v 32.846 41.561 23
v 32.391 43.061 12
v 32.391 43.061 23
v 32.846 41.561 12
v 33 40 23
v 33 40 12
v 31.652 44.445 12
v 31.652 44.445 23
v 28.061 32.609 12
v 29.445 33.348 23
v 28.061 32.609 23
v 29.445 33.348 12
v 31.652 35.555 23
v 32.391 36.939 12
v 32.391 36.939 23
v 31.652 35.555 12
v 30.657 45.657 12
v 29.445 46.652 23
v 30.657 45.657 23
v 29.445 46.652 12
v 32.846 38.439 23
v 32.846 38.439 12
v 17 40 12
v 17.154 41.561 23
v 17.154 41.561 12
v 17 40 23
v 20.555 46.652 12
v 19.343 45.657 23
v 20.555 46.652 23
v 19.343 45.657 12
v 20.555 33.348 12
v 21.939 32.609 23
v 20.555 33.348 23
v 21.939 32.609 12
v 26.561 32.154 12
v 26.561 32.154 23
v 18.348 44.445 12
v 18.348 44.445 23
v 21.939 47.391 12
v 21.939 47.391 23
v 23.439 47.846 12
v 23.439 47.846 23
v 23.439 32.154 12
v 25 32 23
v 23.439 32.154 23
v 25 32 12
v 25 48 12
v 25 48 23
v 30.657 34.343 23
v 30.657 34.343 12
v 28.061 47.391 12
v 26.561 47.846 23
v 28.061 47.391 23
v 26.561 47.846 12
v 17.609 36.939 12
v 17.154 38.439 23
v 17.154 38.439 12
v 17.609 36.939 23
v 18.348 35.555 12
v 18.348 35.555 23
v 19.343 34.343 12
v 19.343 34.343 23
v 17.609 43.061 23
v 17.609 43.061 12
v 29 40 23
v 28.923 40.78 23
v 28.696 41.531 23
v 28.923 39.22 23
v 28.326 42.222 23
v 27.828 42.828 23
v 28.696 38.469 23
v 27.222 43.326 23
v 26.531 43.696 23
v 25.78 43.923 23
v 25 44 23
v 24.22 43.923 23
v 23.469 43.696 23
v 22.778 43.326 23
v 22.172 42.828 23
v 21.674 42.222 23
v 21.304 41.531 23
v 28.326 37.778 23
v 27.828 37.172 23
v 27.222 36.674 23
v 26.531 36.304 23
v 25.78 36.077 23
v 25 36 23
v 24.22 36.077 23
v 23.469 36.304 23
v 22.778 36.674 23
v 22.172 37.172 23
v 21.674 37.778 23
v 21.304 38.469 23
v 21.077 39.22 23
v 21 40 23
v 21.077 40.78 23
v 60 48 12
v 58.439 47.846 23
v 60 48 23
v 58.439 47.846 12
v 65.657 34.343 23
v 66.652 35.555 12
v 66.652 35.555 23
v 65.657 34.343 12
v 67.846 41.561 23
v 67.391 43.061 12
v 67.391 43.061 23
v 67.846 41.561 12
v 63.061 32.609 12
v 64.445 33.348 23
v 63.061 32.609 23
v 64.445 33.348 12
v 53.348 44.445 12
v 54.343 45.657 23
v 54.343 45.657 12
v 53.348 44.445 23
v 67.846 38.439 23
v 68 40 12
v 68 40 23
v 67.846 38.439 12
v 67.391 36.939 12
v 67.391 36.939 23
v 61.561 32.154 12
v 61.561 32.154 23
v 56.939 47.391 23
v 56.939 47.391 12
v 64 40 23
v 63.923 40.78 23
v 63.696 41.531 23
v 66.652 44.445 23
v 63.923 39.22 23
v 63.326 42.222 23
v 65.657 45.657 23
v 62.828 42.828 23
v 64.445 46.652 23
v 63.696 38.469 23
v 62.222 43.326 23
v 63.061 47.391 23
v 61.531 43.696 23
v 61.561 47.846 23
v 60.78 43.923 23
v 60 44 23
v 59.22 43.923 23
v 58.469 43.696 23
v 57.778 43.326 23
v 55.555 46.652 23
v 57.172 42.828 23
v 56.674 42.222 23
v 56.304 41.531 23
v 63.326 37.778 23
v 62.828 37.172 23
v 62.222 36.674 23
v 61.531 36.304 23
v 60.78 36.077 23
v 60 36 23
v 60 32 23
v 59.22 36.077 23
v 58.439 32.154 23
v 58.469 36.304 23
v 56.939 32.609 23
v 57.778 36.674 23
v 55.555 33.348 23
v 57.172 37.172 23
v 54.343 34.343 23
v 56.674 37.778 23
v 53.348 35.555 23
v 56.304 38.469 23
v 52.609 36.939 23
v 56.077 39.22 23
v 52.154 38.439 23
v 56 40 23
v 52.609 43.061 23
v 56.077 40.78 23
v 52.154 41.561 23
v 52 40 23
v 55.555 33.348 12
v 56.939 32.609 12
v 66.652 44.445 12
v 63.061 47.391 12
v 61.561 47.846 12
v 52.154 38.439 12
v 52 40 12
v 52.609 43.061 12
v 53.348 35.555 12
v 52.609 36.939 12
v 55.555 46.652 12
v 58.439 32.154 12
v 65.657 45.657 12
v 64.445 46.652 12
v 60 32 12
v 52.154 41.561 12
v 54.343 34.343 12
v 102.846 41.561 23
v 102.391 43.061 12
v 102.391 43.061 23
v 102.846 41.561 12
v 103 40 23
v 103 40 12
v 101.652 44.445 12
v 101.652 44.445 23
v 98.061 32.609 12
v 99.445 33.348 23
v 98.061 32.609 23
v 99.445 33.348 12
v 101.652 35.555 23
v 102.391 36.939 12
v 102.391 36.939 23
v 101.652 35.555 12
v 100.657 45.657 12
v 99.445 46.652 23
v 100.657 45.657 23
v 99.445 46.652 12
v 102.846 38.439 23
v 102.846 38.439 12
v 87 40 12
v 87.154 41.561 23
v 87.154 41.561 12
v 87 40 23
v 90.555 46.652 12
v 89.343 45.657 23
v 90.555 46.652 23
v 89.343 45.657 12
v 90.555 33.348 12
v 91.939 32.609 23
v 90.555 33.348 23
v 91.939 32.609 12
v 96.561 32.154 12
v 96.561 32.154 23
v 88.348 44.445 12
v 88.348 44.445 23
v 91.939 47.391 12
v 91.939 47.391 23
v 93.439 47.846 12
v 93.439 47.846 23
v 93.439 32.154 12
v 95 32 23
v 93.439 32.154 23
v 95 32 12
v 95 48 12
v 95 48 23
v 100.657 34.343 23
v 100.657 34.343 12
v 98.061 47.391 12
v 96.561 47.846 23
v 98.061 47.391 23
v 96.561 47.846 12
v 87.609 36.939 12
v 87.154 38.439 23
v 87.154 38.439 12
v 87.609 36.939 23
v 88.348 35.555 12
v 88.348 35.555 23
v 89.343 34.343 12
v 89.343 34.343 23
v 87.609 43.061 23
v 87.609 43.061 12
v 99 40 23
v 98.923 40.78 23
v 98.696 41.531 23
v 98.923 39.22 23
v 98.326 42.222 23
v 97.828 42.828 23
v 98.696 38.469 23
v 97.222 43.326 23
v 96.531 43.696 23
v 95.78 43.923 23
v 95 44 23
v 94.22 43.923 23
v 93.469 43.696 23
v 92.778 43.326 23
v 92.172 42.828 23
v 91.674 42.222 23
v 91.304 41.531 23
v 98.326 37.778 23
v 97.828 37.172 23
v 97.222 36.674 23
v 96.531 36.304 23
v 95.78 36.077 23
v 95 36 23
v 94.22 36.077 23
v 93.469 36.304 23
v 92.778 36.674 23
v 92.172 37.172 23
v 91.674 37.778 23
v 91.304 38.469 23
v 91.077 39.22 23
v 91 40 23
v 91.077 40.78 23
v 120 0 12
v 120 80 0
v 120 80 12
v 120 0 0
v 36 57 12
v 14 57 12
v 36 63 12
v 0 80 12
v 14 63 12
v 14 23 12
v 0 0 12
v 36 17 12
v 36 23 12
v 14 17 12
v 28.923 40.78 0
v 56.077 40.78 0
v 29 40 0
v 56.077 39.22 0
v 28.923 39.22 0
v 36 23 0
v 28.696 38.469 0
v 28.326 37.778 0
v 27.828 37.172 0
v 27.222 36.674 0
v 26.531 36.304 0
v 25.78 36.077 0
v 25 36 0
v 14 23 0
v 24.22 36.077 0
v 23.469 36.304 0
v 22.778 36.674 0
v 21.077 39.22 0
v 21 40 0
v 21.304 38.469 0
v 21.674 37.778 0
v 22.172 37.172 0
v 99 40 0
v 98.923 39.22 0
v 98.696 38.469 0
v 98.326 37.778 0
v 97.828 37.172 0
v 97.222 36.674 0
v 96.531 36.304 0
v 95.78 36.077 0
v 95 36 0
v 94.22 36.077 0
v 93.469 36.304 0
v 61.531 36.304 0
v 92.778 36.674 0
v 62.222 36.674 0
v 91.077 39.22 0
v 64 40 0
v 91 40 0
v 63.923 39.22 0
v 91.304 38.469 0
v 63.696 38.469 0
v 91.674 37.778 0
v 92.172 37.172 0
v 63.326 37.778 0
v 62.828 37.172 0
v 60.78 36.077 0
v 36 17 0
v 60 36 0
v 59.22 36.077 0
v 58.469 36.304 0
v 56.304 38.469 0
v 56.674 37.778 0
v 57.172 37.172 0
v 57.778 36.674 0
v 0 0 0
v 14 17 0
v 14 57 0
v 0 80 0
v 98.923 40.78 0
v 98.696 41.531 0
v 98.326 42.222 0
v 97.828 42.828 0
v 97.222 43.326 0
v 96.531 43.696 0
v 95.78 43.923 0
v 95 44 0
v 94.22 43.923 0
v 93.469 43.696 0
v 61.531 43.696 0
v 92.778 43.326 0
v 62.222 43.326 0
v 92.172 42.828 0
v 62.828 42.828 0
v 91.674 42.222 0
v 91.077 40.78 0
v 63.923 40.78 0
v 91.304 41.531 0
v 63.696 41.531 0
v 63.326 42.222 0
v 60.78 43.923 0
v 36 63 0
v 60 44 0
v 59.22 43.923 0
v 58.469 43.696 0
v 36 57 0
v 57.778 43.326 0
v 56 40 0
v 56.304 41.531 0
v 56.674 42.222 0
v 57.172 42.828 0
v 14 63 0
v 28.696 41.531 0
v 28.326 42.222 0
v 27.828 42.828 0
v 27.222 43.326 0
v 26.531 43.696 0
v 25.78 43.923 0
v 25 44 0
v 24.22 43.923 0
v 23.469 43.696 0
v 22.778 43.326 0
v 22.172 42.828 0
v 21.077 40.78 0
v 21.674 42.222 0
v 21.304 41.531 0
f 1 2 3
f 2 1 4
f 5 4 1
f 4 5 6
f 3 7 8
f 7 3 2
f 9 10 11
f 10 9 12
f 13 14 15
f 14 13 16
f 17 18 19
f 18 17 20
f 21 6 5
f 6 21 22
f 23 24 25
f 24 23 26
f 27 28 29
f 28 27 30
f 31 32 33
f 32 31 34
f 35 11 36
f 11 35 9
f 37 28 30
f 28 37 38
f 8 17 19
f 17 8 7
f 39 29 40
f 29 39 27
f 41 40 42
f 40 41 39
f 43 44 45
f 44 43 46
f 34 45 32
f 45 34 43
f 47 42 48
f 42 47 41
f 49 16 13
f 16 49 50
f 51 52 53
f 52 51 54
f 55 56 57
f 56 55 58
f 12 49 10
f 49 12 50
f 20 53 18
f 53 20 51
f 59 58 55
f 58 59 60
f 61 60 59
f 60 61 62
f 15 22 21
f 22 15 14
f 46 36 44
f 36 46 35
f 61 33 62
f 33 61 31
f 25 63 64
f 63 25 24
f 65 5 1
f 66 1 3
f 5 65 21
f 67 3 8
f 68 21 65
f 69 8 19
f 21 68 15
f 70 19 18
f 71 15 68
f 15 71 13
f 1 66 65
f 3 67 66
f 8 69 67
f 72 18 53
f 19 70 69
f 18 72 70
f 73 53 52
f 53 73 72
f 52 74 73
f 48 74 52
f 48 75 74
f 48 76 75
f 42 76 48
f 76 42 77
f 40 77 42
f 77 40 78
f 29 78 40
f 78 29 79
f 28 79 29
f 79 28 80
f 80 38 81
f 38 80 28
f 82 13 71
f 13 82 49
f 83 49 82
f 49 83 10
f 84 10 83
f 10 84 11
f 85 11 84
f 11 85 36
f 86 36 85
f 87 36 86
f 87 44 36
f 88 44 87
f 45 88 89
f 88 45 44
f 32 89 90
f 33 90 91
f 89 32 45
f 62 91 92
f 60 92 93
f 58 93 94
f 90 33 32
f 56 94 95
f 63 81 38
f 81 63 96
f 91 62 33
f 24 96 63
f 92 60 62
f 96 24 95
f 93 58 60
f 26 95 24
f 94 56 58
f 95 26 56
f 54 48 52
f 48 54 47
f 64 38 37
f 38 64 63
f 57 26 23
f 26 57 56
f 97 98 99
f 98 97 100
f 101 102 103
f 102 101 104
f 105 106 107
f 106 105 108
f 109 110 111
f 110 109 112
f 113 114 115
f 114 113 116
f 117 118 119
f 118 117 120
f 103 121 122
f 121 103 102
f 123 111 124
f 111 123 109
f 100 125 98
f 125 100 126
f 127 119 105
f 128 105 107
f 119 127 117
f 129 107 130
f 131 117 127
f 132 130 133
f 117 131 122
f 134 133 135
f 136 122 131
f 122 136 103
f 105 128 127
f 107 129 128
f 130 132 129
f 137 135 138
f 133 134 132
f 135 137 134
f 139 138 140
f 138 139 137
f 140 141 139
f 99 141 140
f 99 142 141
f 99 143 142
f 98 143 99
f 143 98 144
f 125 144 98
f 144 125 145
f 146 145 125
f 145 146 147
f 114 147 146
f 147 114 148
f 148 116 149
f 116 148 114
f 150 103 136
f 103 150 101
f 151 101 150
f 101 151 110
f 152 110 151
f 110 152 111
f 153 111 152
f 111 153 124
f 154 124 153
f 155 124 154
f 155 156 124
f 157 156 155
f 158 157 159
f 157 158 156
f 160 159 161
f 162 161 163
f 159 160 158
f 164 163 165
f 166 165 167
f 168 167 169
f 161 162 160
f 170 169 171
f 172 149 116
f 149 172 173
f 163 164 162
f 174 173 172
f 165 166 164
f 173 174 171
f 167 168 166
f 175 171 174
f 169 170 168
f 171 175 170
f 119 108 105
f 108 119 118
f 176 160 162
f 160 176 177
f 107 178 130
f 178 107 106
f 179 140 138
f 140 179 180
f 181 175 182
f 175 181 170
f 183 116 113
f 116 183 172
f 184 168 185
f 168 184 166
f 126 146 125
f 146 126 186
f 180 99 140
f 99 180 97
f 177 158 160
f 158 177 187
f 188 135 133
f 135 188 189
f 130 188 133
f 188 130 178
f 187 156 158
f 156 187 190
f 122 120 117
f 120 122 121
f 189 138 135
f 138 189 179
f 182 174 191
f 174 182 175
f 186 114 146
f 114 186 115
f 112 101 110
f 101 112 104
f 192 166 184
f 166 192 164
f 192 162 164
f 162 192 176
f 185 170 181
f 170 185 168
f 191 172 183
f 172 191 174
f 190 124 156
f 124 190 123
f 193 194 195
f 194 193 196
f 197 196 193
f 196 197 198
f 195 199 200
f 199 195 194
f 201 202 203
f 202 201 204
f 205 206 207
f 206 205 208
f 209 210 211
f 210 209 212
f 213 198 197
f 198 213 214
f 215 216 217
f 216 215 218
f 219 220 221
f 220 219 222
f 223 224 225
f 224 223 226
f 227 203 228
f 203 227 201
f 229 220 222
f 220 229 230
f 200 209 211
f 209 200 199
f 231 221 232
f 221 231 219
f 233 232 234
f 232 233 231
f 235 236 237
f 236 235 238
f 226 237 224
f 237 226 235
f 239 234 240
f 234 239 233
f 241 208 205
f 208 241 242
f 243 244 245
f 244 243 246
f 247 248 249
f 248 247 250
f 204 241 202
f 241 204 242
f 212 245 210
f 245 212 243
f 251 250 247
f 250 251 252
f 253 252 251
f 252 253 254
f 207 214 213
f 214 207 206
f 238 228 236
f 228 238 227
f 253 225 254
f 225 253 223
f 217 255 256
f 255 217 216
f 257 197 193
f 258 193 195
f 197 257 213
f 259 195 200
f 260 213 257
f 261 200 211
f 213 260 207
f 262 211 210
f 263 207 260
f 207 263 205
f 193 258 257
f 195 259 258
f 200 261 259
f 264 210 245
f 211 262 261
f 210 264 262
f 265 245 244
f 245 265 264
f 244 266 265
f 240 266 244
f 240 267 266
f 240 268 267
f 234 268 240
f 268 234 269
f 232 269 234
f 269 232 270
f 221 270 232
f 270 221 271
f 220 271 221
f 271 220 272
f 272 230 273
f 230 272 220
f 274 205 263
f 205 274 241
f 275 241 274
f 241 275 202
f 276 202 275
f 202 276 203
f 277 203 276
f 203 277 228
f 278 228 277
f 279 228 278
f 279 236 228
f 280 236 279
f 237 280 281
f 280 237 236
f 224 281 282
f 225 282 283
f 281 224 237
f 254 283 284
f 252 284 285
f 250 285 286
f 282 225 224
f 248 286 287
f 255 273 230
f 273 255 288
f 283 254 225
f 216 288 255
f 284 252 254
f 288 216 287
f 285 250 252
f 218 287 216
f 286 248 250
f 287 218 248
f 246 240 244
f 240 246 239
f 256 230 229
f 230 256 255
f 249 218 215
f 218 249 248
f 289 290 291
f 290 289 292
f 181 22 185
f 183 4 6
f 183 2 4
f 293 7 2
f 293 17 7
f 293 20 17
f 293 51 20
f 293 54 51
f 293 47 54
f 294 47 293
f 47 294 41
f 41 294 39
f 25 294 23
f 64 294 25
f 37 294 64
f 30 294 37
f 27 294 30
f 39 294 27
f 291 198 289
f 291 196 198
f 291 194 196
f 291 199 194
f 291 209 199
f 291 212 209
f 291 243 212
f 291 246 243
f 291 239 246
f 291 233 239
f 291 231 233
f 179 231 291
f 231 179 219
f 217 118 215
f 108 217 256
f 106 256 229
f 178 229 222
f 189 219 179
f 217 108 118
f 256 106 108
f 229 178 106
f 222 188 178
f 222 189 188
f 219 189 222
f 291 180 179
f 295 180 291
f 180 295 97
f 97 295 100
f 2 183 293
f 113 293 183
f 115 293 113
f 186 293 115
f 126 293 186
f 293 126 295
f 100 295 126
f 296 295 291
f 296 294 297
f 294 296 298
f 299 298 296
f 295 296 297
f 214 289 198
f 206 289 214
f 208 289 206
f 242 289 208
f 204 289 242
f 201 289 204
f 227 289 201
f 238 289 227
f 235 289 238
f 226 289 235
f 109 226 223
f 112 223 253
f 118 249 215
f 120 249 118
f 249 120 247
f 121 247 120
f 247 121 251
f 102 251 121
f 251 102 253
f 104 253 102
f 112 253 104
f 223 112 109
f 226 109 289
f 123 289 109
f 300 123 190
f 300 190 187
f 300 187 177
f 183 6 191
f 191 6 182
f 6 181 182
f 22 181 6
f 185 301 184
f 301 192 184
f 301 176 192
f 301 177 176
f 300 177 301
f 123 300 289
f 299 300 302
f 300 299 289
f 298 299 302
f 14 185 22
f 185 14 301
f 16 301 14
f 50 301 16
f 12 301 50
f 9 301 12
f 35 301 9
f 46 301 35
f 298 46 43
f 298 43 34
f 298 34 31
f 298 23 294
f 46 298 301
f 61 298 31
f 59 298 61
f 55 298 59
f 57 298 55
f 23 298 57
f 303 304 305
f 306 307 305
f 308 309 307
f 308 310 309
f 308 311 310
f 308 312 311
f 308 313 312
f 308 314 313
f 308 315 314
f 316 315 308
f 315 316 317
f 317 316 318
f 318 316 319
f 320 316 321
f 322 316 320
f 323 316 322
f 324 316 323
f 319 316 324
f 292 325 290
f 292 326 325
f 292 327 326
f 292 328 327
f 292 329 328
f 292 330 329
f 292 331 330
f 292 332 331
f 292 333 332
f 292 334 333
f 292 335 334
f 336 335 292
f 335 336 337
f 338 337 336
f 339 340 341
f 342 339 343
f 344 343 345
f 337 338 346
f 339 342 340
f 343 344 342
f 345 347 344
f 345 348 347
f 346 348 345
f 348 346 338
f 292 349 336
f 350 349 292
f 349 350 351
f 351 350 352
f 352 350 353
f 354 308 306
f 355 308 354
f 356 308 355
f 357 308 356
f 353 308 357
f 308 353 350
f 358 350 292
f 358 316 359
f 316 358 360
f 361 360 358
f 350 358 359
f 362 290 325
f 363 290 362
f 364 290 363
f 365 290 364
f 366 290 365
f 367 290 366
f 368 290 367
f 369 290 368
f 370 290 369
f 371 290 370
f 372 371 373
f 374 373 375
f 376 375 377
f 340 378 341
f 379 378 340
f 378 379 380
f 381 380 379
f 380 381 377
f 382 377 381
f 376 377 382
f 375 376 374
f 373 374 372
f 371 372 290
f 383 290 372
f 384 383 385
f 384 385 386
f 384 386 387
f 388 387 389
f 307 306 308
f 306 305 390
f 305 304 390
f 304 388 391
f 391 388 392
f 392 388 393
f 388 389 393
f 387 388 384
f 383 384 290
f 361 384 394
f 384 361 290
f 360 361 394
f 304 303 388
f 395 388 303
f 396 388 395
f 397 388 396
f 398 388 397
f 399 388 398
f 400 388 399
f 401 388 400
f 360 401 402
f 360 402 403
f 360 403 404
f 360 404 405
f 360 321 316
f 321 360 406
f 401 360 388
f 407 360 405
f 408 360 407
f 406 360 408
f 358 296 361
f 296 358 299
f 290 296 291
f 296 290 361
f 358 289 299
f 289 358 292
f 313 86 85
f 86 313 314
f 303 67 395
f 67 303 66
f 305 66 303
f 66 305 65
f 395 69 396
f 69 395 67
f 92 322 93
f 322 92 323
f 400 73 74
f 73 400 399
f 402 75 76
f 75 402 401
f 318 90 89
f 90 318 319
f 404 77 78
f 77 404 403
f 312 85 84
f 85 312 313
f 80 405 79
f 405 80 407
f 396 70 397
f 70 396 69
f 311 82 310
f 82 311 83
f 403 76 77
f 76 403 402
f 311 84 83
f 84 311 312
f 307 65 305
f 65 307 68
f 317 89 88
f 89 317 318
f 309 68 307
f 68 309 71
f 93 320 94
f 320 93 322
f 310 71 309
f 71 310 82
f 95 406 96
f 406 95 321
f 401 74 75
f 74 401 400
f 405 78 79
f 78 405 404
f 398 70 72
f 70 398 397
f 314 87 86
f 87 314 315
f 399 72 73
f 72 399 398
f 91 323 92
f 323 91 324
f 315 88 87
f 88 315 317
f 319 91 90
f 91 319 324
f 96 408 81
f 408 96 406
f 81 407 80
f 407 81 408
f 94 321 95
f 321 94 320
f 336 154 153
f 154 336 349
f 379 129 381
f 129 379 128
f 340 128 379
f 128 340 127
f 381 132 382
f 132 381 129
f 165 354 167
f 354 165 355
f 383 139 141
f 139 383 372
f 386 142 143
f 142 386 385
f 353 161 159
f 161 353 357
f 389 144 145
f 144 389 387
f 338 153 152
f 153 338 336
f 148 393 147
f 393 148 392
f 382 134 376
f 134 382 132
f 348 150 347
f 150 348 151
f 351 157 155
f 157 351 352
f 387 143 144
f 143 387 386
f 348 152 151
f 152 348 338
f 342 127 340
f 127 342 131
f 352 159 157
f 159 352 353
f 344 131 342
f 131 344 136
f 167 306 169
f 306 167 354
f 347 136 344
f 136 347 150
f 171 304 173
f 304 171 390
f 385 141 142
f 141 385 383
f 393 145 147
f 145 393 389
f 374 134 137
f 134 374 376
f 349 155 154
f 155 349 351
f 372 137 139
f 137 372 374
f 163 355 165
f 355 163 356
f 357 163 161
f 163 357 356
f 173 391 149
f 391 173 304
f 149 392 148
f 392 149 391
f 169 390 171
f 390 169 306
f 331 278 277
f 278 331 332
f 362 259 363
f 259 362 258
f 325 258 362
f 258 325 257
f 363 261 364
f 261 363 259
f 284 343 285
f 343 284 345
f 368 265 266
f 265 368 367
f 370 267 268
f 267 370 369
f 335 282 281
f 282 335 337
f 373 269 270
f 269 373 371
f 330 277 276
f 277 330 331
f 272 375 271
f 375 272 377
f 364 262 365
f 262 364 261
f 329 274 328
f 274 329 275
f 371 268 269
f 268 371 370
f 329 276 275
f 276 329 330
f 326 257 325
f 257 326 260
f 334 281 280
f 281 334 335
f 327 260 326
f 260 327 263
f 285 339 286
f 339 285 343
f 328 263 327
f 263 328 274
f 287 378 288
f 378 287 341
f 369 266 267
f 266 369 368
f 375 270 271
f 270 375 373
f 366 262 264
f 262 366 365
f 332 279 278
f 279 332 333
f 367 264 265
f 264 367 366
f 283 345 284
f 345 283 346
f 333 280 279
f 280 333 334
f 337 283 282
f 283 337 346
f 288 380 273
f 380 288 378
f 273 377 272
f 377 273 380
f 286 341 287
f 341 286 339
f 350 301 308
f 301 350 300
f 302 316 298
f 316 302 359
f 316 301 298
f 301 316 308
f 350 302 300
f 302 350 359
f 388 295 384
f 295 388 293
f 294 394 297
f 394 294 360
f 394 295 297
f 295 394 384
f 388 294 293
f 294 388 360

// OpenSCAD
$fn = 32;

// ----------------------------------------------------------------------
// Drill jig: three_boss_slot jig
// ----------------------------------------------------------------------

// --- parameters (mm) ---
plate_l = 120;            // plate length, X
plate_w = 80;             // plate width, Y
plate_t = 12;             // plate thickness
boss_d = 16;              // guide boss diameter
boss_h = 12;              // boss height above the plate
guide_d = 8;              // guide hole diameter
boss_pitch = 35;          // boss pitch
slot_w = 6;               // clamp slot width
slot_l = 22;              // clamp slot length
slot_x = 14;              // slot start X

n_boss = 3;  // guide bosses
boss_x0 = (plate_l - (n_boss - 1) * boss_pitch) / 2;  // first boss X
boss_top = plate_t - 1 + boss_h;  // boss crown height
total_h = boss_top;  // overall height

difference() {
  union() {
  cube([plate_l, plate_w, plate_t]);
  for (i = [0 : n_boss - 1])
    translate([boss_x0 + i * boss_pitch, plate_w / 2, plate_t - 1])
      cylinder(h = boss_h, d = boss_d);
  }
  for (i = [0 : n_boss - 1])
    translate([boss_x0 + i * boss_pitch, plate_w / 2, -1])
      cylinder(h = plate_t + boss_h, d = guide_d);
  for (cy = [plate_w * 0.25, plate_w * 0.75])
    translate([slot_x, cy - slot_w / 2, -1])
      cube([slot_l, slot_w, plate_t + 2]);
}
